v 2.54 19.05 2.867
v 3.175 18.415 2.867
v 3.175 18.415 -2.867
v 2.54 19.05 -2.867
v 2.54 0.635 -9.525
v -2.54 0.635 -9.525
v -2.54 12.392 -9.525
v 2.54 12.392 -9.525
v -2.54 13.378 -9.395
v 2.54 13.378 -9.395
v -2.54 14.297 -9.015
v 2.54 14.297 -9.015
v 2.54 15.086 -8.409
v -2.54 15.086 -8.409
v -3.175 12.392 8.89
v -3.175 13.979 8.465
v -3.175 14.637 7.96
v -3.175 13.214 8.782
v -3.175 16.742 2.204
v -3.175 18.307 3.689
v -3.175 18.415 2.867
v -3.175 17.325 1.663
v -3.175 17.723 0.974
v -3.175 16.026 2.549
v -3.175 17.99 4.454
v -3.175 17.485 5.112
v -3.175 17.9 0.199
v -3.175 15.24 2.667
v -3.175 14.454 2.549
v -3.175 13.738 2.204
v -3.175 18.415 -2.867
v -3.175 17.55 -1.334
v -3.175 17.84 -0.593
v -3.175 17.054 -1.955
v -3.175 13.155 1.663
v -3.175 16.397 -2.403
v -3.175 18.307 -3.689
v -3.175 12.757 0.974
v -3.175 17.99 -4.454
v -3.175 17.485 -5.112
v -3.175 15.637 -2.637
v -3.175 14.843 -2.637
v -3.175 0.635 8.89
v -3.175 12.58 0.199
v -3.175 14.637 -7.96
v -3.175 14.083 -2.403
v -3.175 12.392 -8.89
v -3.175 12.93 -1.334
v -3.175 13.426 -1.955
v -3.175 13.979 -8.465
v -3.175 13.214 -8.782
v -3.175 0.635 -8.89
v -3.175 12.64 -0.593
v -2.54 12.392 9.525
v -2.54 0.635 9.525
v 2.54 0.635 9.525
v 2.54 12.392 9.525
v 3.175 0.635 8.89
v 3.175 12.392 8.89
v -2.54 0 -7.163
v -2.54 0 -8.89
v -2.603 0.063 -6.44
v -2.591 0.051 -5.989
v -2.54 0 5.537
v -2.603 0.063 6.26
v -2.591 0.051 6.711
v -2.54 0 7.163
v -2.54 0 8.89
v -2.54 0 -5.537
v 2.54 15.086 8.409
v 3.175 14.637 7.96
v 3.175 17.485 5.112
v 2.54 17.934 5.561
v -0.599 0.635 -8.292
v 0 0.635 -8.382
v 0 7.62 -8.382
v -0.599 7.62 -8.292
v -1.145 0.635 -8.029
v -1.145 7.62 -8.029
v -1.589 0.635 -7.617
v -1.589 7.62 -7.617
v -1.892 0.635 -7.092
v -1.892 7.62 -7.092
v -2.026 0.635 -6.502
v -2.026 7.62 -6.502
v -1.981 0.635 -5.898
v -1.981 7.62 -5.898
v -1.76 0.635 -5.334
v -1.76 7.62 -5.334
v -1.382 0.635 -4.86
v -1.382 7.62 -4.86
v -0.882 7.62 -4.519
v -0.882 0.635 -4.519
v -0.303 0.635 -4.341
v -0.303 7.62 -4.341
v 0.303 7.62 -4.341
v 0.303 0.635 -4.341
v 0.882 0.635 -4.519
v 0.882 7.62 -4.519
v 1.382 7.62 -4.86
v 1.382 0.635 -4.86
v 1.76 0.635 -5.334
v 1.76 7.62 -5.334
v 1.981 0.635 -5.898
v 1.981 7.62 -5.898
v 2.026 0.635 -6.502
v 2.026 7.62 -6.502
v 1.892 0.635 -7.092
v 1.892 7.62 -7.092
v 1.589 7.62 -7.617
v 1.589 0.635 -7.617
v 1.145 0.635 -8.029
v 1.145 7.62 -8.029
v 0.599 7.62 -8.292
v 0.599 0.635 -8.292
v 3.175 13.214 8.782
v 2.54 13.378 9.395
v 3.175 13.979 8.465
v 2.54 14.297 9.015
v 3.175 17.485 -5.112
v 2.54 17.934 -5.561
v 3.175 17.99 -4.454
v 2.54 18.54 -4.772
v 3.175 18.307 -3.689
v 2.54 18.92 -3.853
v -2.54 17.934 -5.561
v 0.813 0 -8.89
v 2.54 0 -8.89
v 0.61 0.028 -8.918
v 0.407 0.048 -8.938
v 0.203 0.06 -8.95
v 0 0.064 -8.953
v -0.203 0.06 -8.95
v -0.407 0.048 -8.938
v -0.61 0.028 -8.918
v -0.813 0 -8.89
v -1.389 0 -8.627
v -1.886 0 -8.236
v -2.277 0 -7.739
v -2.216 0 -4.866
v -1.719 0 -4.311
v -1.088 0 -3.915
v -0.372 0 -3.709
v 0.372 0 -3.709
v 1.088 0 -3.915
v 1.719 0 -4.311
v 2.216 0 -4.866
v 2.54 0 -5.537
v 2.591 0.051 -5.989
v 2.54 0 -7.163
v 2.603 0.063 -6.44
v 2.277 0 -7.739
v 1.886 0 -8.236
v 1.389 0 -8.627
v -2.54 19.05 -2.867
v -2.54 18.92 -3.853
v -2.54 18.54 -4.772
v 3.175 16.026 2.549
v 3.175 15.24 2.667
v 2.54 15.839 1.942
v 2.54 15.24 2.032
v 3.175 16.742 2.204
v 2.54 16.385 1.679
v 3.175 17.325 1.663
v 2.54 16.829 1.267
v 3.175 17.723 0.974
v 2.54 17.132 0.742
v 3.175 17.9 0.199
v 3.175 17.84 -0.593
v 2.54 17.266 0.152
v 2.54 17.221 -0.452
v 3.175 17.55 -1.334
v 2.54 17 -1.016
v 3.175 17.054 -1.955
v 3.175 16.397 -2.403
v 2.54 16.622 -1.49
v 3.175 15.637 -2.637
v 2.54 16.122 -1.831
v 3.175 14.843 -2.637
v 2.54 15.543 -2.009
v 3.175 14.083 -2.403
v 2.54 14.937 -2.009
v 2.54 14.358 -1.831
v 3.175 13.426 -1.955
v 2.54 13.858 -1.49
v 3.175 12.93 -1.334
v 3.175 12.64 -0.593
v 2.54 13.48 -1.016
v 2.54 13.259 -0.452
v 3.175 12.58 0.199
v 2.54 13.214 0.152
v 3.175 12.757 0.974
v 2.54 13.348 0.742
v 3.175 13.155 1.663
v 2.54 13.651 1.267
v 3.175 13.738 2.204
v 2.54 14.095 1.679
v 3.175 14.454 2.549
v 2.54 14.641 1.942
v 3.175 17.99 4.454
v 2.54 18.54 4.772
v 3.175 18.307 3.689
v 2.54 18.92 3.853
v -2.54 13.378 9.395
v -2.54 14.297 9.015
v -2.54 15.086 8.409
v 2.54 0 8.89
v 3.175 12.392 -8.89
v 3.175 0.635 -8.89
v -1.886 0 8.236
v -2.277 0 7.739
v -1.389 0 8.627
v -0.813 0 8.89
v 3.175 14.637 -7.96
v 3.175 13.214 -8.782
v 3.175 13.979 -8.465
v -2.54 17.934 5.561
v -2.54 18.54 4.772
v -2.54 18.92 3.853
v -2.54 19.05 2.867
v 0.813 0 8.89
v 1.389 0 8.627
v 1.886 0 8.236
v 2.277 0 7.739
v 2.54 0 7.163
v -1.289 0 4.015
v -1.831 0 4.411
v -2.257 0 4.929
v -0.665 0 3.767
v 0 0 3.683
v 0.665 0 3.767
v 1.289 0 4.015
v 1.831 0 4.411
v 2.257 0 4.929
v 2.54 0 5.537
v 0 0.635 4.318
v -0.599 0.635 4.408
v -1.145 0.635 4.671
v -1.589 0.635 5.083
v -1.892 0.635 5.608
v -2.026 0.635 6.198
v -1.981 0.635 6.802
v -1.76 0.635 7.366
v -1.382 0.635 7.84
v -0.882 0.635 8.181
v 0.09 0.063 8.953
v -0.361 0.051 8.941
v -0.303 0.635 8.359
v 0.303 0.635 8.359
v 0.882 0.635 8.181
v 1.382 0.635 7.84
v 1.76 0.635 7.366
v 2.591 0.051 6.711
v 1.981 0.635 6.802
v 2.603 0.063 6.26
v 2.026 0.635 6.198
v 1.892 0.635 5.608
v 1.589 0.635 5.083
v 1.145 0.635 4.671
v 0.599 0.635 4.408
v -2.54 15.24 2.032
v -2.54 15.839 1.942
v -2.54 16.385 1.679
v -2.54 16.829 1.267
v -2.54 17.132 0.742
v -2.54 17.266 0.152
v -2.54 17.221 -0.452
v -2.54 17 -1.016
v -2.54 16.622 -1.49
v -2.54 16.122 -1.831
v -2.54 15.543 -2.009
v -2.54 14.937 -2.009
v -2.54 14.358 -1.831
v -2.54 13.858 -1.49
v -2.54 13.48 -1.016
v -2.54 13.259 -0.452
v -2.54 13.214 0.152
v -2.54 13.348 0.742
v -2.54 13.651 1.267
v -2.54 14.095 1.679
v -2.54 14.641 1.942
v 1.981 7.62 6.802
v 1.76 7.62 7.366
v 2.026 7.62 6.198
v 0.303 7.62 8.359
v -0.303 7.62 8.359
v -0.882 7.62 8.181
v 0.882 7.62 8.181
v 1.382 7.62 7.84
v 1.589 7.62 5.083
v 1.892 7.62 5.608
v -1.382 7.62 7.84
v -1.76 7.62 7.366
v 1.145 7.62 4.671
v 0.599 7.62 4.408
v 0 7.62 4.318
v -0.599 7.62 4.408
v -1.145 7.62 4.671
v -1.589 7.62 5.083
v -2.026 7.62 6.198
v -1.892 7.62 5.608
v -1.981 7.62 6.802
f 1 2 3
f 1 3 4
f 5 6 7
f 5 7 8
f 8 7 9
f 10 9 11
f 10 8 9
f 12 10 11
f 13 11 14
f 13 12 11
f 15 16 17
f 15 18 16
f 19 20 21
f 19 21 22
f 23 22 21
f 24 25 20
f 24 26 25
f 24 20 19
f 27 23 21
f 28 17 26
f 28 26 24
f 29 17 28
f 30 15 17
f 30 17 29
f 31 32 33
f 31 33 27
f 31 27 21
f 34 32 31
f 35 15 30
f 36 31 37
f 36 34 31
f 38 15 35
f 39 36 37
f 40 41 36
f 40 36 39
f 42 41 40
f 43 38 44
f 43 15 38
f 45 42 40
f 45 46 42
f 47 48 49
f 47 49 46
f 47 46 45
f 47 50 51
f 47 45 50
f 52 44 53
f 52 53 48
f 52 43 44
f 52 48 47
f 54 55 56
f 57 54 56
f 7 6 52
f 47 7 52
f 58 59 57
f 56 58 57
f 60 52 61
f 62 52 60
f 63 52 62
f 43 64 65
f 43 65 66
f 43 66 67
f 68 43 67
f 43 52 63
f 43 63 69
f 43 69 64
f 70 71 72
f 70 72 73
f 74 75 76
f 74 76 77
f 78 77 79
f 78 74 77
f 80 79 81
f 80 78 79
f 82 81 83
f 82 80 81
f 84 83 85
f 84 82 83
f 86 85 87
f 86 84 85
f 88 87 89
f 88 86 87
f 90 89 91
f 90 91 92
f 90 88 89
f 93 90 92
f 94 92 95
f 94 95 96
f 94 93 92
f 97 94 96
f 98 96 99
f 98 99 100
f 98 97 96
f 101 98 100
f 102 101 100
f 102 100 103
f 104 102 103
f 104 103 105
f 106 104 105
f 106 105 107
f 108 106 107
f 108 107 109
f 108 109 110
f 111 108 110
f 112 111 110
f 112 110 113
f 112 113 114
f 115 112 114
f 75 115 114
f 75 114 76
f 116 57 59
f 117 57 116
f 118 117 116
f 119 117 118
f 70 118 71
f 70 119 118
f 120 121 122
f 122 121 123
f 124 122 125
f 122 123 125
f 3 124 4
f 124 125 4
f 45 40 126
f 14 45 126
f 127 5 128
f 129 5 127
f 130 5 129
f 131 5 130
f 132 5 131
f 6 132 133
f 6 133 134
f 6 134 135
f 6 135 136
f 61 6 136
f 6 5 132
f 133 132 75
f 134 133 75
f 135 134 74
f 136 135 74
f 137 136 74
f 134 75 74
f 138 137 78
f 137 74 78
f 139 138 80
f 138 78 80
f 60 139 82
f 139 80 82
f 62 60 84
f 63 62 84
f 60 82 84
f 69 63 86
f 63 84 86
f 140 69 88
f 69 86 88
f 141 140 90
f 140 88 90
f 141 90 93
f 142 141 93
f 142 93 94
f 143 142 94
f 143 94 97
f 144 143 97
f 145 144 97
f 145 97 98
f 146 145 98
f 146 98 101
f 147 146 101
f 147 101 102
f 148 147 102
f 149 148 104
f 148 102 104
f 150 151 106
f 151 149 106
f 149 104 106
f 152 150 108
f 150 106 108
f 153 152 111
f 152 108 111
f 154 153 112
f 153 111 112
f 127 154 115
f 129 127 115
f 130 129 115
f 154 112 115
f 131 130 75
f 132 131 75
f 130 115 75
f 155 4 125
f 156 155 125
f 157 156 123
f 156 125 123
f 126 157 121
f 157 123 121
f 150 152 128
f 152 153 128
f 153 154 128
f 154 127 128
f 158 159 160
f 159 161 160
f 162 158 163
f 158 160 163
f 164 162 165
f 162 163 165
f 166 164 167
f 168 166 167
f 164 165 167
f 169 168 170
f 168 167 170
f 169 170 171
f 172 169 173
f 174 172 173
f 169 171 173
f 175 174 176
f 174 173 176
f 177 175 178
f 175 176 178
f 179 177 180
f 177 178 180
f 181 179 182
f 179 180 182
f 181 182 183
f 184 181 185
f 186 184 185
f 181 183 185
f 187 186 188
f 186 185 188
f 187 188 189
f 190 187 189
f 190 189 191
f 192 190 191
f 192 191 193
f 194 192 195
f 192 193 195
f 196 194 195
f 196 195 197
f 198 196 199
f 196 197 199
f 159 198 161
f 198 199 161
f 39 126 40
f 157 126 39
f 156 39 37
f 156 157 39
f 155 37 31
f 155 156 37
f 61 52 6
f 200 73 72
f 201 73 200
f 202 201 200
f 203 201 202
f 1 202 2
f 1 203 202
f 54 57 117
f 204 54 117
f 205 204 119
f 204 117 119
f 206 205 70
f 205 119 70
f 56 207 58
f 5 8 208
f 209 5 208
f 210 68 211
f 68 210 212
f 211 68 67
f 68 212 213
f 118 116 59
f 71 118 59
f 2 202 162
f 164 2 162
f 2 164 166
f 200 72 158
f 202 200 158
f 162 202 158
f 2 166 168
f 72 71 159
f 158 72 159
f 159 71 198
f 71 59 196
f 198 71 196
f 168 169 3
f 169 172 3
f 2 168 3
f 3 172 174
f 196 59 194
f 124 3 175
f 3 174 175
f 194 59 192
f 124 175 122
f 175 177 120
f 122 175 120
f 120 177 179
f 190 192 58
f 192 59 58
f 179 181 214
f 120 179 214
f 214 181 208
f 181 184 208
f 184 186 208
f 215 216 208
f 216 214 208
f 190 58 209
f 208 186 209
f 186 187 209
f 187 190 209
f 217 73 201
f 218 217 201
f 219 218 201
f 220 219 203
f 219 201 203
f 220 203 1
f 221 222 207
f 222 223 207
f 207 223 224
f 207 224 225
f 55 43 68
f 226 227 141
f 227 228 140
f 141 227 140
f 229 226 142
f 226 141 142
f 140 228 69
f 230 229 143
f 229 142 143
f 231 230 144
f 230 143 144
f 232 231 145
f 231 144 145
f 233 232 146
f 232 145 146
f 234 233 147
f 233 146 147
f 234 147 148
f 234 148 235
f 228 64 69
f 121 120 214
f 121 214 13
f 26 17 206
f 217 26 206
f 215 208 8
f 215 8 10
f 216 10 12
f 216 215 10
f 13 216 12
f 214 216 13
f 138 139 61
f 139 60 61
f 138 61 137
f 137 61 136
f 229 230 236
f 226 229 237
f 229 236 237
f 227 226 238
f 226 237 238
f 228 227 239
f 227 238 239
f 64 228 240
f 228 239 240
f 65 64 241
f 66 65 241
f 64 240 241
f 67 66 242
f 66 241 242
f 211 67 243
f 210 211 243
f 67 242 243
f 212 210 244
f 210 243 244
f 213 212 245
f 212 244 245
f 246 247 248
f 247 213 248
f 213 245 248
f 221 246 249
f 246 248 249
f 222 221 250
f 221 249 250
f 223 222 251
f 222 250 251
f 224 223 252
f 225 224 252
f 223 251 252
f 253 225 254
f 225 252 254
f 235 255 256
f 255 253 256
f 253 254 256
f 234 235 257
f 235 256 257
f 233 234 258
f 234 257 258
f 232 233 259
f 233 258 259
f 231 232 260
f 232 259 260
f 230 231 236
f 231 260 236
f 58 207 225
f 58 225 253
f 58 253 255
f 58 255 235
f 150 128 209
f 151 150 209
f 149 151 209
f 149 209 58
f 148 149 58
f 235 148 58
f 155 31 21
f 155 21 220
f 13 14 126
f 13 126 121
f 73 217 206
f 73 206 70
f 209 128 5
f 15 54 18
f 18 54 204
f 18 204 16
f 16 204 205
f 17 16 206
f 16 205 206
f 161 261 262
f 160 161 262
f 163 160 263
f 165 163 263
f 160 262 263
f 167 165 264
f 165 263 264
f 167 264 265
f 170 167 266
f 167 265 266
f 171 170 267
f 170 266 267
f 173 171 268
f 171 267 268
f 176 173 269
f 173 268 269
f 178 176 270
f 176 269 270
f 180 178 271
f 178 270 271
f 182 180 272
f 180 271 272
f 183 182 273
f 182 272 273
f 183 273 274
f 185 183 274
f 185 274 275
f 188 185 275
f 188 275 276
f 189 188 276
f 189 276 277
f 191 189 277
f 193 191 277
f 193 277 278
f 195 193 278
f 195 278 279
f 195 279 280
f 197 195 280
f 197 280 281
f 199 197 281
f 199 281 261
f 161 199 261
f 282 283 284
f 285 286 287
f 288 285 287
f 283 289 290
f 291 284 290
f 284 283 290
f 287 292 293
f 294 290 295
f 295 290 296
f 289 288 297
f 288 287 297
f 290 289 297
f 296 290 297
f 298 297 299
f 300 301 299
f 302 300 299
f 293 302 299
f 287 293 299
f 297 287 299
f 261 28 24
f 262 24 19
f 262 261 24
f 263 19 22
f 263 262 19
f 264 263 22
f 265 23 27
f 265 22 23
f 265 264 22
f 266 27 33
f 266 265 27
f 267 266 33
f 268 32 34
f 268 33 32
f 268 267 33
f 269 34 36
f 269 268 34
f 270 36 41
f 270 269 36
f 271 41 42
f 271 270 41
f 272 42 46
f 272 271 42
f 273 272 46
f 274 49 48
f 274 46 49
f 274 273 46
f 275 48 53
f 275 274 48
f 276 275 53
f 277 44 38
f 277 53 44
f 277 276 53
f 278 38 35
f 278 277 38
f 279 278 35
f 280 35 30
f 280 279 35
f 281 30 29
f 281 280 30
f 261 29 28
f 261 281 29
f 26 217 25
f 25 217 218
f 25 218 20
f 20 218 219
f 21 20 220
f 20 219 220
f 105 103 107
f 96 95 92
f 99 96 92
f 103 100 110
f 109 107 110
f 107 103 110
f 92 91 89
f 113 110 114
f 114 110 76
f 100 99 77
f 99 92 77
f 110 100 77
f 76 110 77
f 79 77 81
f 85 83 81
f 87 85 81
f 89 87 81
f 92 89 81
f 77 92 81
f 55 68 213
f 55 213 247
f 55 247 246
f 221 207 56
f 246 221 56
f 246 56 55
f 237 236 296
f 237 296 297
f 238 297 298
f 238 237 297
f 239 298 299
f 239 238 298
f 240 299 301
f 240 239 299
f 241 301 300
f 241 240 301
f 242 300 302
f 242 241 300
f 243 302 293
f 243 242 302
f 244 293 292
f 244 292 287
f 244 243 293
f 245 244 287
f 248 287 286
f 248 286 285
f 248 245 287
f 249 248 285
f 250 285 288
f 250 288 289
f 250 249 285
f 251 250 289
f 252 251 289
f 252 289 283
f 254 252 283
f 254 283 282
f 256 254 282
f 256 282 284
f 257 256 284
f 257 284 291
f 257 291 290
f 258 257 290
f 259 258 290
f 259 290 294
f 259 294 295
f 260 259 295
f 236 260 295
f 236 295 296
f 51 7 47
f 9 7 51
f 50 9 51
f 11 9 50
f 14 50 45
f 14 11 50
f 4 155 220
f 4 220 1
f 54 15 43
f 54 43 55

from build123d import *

# Parameters (mm, degrees)
SKETCH1_W           = 6.35
SKETCH1_H           = 19.05
BOSS_EXTRUDE1_DEPTH = 19.05
SKETCH2_R           = 2.032
CUT_EXTRUDE1_DEPTH  = 23.225
SKETCH1_3_R         = 2.032
CUT_EXTRUDE2_DEPTH  = 7.62
CHAMFER1_SIZE       = 5.08
FILLET1_R           = 3.81


with BuildPart() as part:
    # Sketch1 → Boss-Extrude1 (new body)
    with BuildSketch(Plane(origin=(0, 0, 0), x_dir=(1, 0, 0), z_dir=(0, 1, 0))):
        Rectangle(SKETCH1_W, SKETCH1_H)
    extrude(amount=BOSS_EXTRUDE1_DEPTH)

    # Sketch2 → Cut-Extrude1 (cut, through all)
    with BuildSketch(Plane.ZY.offset(3.175)):
        with Locations((0, 15.24)):
            Circle(SKETCH2_R)
    extrude(amount=-CUT_EXTRUDE1_DEPTH, mode=Mode.SUBTRACT)

    # Sketch1<3> → Cut-Extrude2 (cut)
    with BuildSketch(Plane(origin=(0, 0, 0), x_dir=(1, 0, 0), z_dir=(0, 1, 0))):
        with Locations(Location((0, 6.35, 0), (0, 0, 90))):
            Circle(SKETCH1_3_R)
        with Locations(Location((0, -6.35, 0), (0, 0, 90))):
            Circle(SKETCH1_3_R)
    extrude(amount=CUT_EXTRUDE2_DEPTH, mode=Mode.SUBTRACT)

    # Chamfer1
    chamfer1_edges = [part.edges().sort_by_distance(p)[0] for p in [
        (0, 19.05, 9.525),
        (0, 19.05, -9.525),
    ]]
    chamfer(chamfer1_edges, length=CHAMFER1_SIZE)

    # Fillet1
    fillet1_edges = [part.edges().sort_by_distance(p)[0] for p in [
        (0, 19.05, -4.445),
        (0, 19.05, 4.445),
        (0, 13.97, 9.525),
        (0, 13.97, -9.525),
    ]]
    fillet(fillet1_edges, radius=FILLET1_R)

    # Chamfer2
    # the kernel refuses this chamfer: 0.635 mm, written as the material it takes off along each edge
    with BuildSketch(Plane(origin=(2.751666667, 0.423333333, 9.101666667), x_dir=(0.7071067811865476, 0.7071067811865474, 0), z_dir=(0.5773502691896255, -0.5773502691896256, 0.5773502691896261)), Plane(origin=(-2.751666667, 0.423333333, 9.101666667), x_dir=(0.7071067811865476, -0.7071067811865474, 0), z_dir=(-0.5773502691896257, -0.5773502691896258, 0.5773502691896257))) as chamfer2_piece_1:
        Polygon((-0.449012806, -0.259237664), (0.449012806, -0.259237664), (0, 0.518475329), align=None)
    extrude(amount=0.806558326, mode=Mode.SUBTRACT)
    with BuildSketch(Plane(origin=(-2.751666667, 0.423333333, -9.101666667), x_dir=(-0.7071067811865476, 0, 0.7071067811865476), z_dir=(-0.5773502691896258, -0.5773502691896255, -0.5773502691896258)), Plane(origin=(2.751666667, 0.423333333, -9.101666667), x_dir=(0, -0.7071067811865477, 0.7071067811865474), z_dir=(0.5773502691896258, -0.5773502691896255, -0.5773502691896258))) as chamfer2_piece_2:
        Polygon((-0.449012806, 0.259237664), (0.449012806, 0.259237664), (0, -0.518475329), align=None)
    extrude(amount=0.806558326, mode=Mode.SUBTRACT)
    with BuildSketch(Plane(origin=(3.175, 15.24, 0), x_dir=(0, 0, 1), z_dir=(0, -1, 0))) as chamfer2_piece_3:
        with BuildLine():
            Line((2.684960512, -0.017960512), (2.014039488, 0.652960512))
            Line((2.014039488, 0.652960512), (2.001339488, 0.652960512))
            ThreePointArc((2.001339488, 0.652960512), (2.0193, 0.326480256), (2.0193, 0))
            Line((2.0193, 0), (2.032, -0.0127))
            ThreePointArc((2.032, -0.0127), (2.358480256, -0.0127), (2.684960512, -0.030660512))
            Line((2.684960512, -0.030660512), (2.684960512, -0.017960512))
        make_face()
    revolve(axis=Axis((3.175, 15.24, 0), (-1, 0, 0)), mode=Mode.SUBTRACT)
    with BuildSketch(Plane(origin=(-3.175, 15.24, 0), x_dir=(0, 0, 1), z_dir=(0, -1, 0))) as chamfer2_piece_4:
        with BuildLine():
            Line((2.684960512, 0.017960512), (2.014039488, -0.652960512))
            Line((2.014039488, -0.652960512), (2.001339488, -0.652960512))
            ThreePointArc((2.001339488, -0.652960512), (2.0193, -0.326480256), (2.0193, 0))
            Line((2.0193, 0), (2.032, 0.0127))
            ThreePointArc((2.032, 0.0127), (2.358480256, 0.0127), (2.684960512, 0.030660512))
            Line((2.684960512, 0.030660512), (2.684960512, 0.017960512))
        make_face()
    revolve(axis=Axis((-3.175, 15.24, 0), (-1, 0, 0)), mode=Mode.SUBTRACT)
    with BuildSketch(Plane(origin=(0, 0, -6.35), x_dir=(0, 0, -1), z_dir=(1, 0, 0))) as chamfer2_piece_5:
        with BuildLine():
            Line((2.684960512, -0.017960512), (2.014039488, 0.652960512))
            Line((2.014039488, 0.652960512), (2.001339488, 0.652960512))
            ThreePointArc((2.001339488, 0.652960512), (2.0193, 0.326480256), (2.0193, 0))
            Line((2.0193, 0), (2.032, -0.0127))
            ThreePointArc((2.032, -0.0127), (2.358480256, -0.0127), (2.684960512, -0.030660512))
            Line((2.684960512, -0.030660512), (2.684960512, -0.017960512))
        make_face()
    revolve(axis=Axis((0, 0, -6.35), (0, 1, 0)), mode=Mode.SUBTRACT)
    with BuildSketch(Plane(origin=(0, 0, 6.35), x_dir=(0, 0, -1), z_dir=(1, 0, 0))) as chamfer2_piece_6:
        with BuildLine():
            Line((2.684960512, -0.017960512), (2.014039488, 0.652960512))
            Line((2.014039488, 0.652960512), (2.001339488, 0.652960512))
            ThreePointArc((2.001339488, 0.652960512), (2.0193, 0.326480256), (2.0193, 0))
            Line((2.0193, 0), (2.032, -0.0127))
            ThreePointArc((2.032, -0.0127), (2.358480256, -0.0127), (2.684960512, -0.030660512))
            Line((2.684960512, -0.030660512), (2.684960512, -0.017960512))
        make_face()
    revolve(axis=Axis((0, 0, 6.35), (0, 1, 0)), mode=Mode.SUBTRACT)
    with BuildSketch(Plane(origin=(3.175, -1.633018697, 9.525), x_dir=(0.027495876610586664, 0, -0.9996219169112968), z_dir=(0, 1, 0)), Plane(origin=(3.175, -1.633018697, -9.525), x_dir=(-0.9996219169112968, 0, -0.027495876610587288), z_dir=(0, 1, 0))) as chamfer2_piece_7:
        with BuildLine():
            Line((0.653207479, 0), (-0.035907443, 0.652219799))
            Line((-0.035907443, 0.652219799), (-0.048602642, 0.651870601))
            ThreePointArc((-0.048602642, 0.651870601), (-0.021672059, 0.326007622), (-0.012695198, -0.000349198))
            Line((-0.012695198, -0.000349198), (0.000349198, -0.012695198))
            ThreePointArc((0.000349198, -0.012695198), (0.326706017, -0.003718338), (0.653556677, -0.012695198))
            Line((0.653556677, -0.012695198), (0.653207479, 0))
        make_face()
    extrude(amount=14.024865025, mode=Mode.SUBTRACT)
    with BuildSketch(Plane(origin=(-3.175, -1.633018697, 9.525), x_dir=(-0.02749587661058659, 0, -0.9996219169112968), z_dir=(0, 1, 0)), Plane(origin=(-3.175, -1.633018697, -9.525), x_dir=(0.9996219169112968, 0, -0.027495876610587288), z_dir=(0, 1, 0))) as chamfer2_piece_8:
        with BuildLine():
            Line((0.653207479, 0), (-0.035907443, -0.652219799))
            Line((-0.035907443, -0.652219799), (-0.048602642, -0.651870601))
            ThreePointArc((-0.048602642, -0.651870601), (-0.021672059, -0.326007622), (-0.012695198, 0.000349198))
            Line((-0.012695198, 0.000349198), (0.000349198, 0.012695198))
            ThreePointArc((0.000349198, 0.012695198), (0.326706017, 0.003718338), (0.653556677, 0.012695198))
            Line((0.653556677, 0.012695198), (0.653207479, 0))
        make_face()
    extrude(amount=14.024865025, mode=Mode.SUBTRACT)
    with BuildSketch(Plane(origin=(-3.175, 17.934076836, 5.560923164), x_dir=(-0.027495876610585324, -0.7068394360706735, -0.7068394360706735), z_dir=(0, -0.7071067811865476, 0.7071067811865476)), Plane(origin=(-3.175, 15.085923164, -8.409076836), x_dir=(-0.027495876610586552, -0.7068394360706735, 0.7068394360706735), z_dir=(0, 0.7071067811865476, 0.7071067811865476))) as chamfer2_piece_9:
        with BuildLine():
            Line((0.653207479, 0), (-0.035907443, 0.652219799))
            Line((-0.035907443, 0.652219799), (-0.048602642, 0.651870601))
            ThreePointArc((-0.048602642, 0.651870601), (-0.021672059, 0.326007622), (-0.012695198, -0.000349198))
            Line((-0.012695198, -0.000349198), (0.000349198, -0.012695198))
            ThreePointArc((0.000349198, -0.012695198), (0.326706017, -0.003718338), (0.653556677, -0.012695198))
            Line((0.653556677, -0.012695198), (0.653207479, 0))
        make_face()
    extrude(amount=4.027897552, mode=Mode.SUBTRACT)
    with BuildSketch(Plane(origin=(-3.175, 19.05, 2.866846327), x_dir=(-0.02749587661058659, -0.9996219169112968, 0), z_dir=(0, 0, -1)), Plane(origin=(3.175, 19.05, -2.866846327), x_dir=(0.02749587661058659, -0.9996219169112968, 0), z_dir=(0, 0, 1))) as chamfer2_piece_10:
        with BuildLine():
            Line((0.653207479, 0), (-0.035907443, -0.652219799))
            Line((-0.035907443, -0.652219799), (-0.048602642, -0.651870601))
            ThreePointArc((-0.048602642, -0.651870601), (-0.021672059, -0.326007622), (-0.012695198, 0.000349198))
            Line((-0.012695198, 0.000349198), (0.000349198, 0.012695198))
            ThreePointArc((0.000349198, 0.012695198), (0.326706017, 0.003718338), (0.653556677, 0.012695198))
            Line((0.653556677, 0.012695198), (0.653207479, 0))
        make_face()
    extrude(amount=5.733692655, mode=Mode.SUBTRACT)
    with BuildSketch(Plane(origin=(-3.175, 15.24, -2.866846327), x_dir=(0, 0.7071067811865476, -0.7071067811865474), z_dir=(0, -0.7071067811865474, -0.7071067811865476))) as chamfer2_piece_11:
        with BuildLine():
            Line((3.157039488, -0.017960512), (3.827960512, 0.652960512))
            Line((3.827960512, 0.652960512), (3.840660512, 0.652960512))
            ThreePointArc((3.840660512, 0.652960512), (3.8227, 0.326480256), (3.8227, 0))
            Line((3.8227, 0), (3.81, -0.0127))
            ThreePointArc((3.81, -0.0127), (3.483519744, -0.0127), (3.157039488, -0.030660512))
            Line((3.157039488, -0.030660512), (3.157039488, -0.017960512))
        make_face()
    revolve(axis=Axis((-3.175, 15.24, -2.866846327), (1, 0, 0)), revolution_arc=45, mode=Mode.SUBTRACT)
    with BuildSketch(Plane(origin=(-3.175, 12.391846327, -5.715), x_dir=(0, 0, -1), z_dir=(0, -1, 0))) as chamfer2_piece_12:
        with BuildLine():
            Line((3.157039488, -0.017960512), (3.827960512, 0.652960512))
            Line((3.827960512, 0.652960512), (3.840660512, 0.652960512))
            ThreePointArc((3.840660512, 0.652960512), (3.8227, 0.326480256), (3.8227, 0))
            Line((3.8227, 0), (3.81, -0.0127))
            ThreePointArc((3.81, -0.0127), (3.483519744, -0.0127), (3.157039488, -0.030660512))
            Line((3.157039488, -0.030660512), (3.157039488, -0.017960512))
        make_face()
    revolve(axis=Axis((-3.175, 12.391846327, -5.715), (1, 0, 0)), revolution_arc=45, mode=Mode.SUBTRACT)
    with BuildSketch(Plane(origin=(-3.175, 15.24, 2.866846327), x_dir=(0, 0.7071067811865476, 0.7071067811865474), z_dir=(0, -0.7071067811865474, 0.7071067811865476))) as chamfer2_piece_13:
        with BuildLine():
            Line((3.157039488, 0.017960512), (3.827960512, -0.652960512))
            Line((3.827960512, -0.652960512), (3.840660512, -0.652960512))
            ThreePointArc((3.840660512, -0.652960512), (3.8227, -0.326480256), (3.8227, 0))
            Line((3.8227, 0), (3.81, 0.0127))
            ThreePointArc((3.81, 0.0127), (3.483519744, 0.0127), (3.157039488, 0.030660512))
            Line((3.157039488, 0.030660512), (3.157039488, 0.017960512))
        make_face()
    revolve(axis=Axis((-3.175, 15.24, 2.866846327), (-1, 0, 0)), revolution_arc=45, mode=Mode.SUBTRACT)
    with BuildSketch(Plane(origin=(-3.175, 12.391846327, 5.715), x_dir=(0, 0, 1), z_dir=(0, -1, 0))) as chamfer2_piece_14:
        with BuildLine():
            Line((3.157039488, 0.017960512), (3.827960512, -0.652960512))
            Line((3.827960512, -0.652960512), (3.840660512, -0.652960512))
            ThreePointArc((3.840660512, -0.652960512), (3.8227, -0.326480256), (3.8227, 0))
            Line((3.8227, 0), (3.81, 0.0127))
            ThreePointArc((3.81, 0.0127), (3.483519744, 0.0127), (3.157039488, 0.030660512))
            Line((3.157039488, 0.030660512), (3.157039488, 0.017960512))
        make_face()
    revolve(axis=Axis((-3.175, 12.391846327, 5.715), (-1, 0, 0)), revolution_arc=45, mode=Mode.SUBTRACT)
    with BuildSketch(Plane(origin=(3.175, 17.934076836, 5.560923164), x_dir=(0.02749587661058674, -0.7068394360706736, -0.7068394360706736), z_dir=(0, -0.7071067811865476, 0.7071067811865476)), Plane(origin=(3.175, 15.085923164, -8.409076836), x_dir=(0.027495876610585872, -0.7068394360706735, 0.7068394360706735), z_dir=(0, 0.7071067811865476, 0.7071067811865476))) as chamfer2_piece_15:
        with BuildLine():
            Line((0.653207479, 0), (-0.035907443, -0.652219799))
            Line((-0.035907443, -0.652219799), (-0.048602642, -0.651870601))
            ThreePointArc((-0.048602642, -0.651870601), (-0.021672059, -0.326007622), (-0.012695198, 0.000349198))
            Line((-0.012695198, 0.000349198), (0.000349198, 0.012695198))
            ThreePointArc((0.000349198, 0.012695198), (0.326706017, 0.003718338), (0.653556677, 0.012695198))
            Line((0.653556677, 0.012695198), (0.653207479, 0))
        make_face()
    extrude(amount=4.027897552, mode=Mode.SUBTRACT)
    with BuildSketch(Plane(origin=(-3.175, 0, 11.158018697), x_dir=(-0.027495876610586605, 0.9996219169112968, 0), z_dir=(0, 0, -1))) as chamfer2_piece_16:
        with BuildLine():
            Line((0.653207479, 0), (-0.035907443, 0.652219799))
            Line((-0.035907443, 0.652219799), (-0.048602642, 0.651870601))
            ThreePointArc((-0.048602642, 0.651870601), (-0.021672059, 0.326007622), (-0.012695198, -0.000349198))
            Line((-0.012695198, -0.000349198), (0.000349198, -0.012695198))
            ThreePointArc((0.000349198, -0.012695198), (0.326706017, -0.003718338), (0.653556677, -0.012695198))
            Line((0.653556677, -0.012695198), (0.653207479, 0))
        make_face()
    extrude(amount=22.316037395, mode=Mode.SUBTRACT)
    with BuildSketch(Plane(origin=(3.175, 15.24, -2.866846327), x_dir=(0, 0.7071067811865476, -0.7071067811865474), z_dir=(0, -0.7071067811865474, -0.7071067811865476))) as chamfer2_piece_17:
        with BuildLine():
            Line((3.157039488, 0.017960512), (3.827960512, -0.652960512))
            Line((3.827960512, -0.652960512), (3.840660512, -0.652960512))
            ThreePointArc((3.840660512, -0.652960512), (3.8227, -0.326480256), (3.8227, 0))
            Line((3.8227, 0), (3.81, 0.0127))
            ThreePointArc((3.81, 0.0127), (3.483519744, 0.0127), (3.157039488, 0.030660512))
            Line((3.157039488, 0.030660512), (3.157039488, 0.017960512))
        make_face()
    revolve(axis=Axis((3.175, 15.24, -2.866846327), (1, 0, 0)), revolution_arc=45, mode=Mode.SUBTRACT)
    with BuildSketch(Plane(origin=(3.175, 12.391846327, -5.715), x_dir=(0, 0, -1), z_dir=(0, -1, 0))) as chamfer2_piece_18:
        with BuildLine():
            Line((3.827960512, -0.652960512), (3.157039488, 0.017960512))
            Line((3.157039488, 0.017960512), (3.157039488, 0.030660512))
            ThreePointArc((3.157039488, 0.030660512), (3.483519744, 0.0127), (3.81, 0.0127))
            Line((3.81, 0.0127), (3.8227, 0))
            ThreePointArc((3.8227, 0), (3.8227, -0.326480256), (3.840660512, -0.652960512))
            Line((3.840660512, -0.652960512), (3.827960512, -0.652960512))
        make_face()
    revolve(axis=Axis((3.175, 12.391846327, -5.715), (1, 0, 0)), revolution_arc=45, mode=Mode.SUBTRACT)
    with BuildSketch(Plane(origin=(3.175, 15.24, 2.866846327), x_dir=(0, 0.7071067811865476, 0.7071067811865474), z_dir=(0, -0.7071067811865474, 0.7071067811865476))) as chamfer2_piece_19:
        with BuildLine():
            Line((3.157039488, -0.017960512), (3.827960512, 0.652960512))
            Line((3.827960512, 0.652960512), (3.840660512, 0.652960512))
            ThreePointArc((3.840660512, 0.652960512), (3.8227, 0.326480256), (3.8227, 0))
            Line((3.8227, 0), (3.81, -0.0127))
            ThreePointArc((3.81, -0.0127), (3.483519744, -0.0127), (3.157039488, -0.030660512))
            Line((3.157039488, -0.030660512), (3.157039488, -0.017960512))
        make_face()
    revolve(axis=Axis((3.175, 15.24, 2.866846327), (-1, 0, 0)), revolution_arc=45, mode=Mode.SUBTRACT)
    with BuildSketch(Plane(origin=(3.175, 12.391846327, 5.715), x_dir=(0, 0, 1), z_dir=(0, -1, 0))) as chamfer2_piece_20:
        with BuildLine():
            Line((3.157039488, -0.017960512), (3.827960512, 0.652960512))
            Line((3.827960512, 0.652960512), (3.840660512, 0.652960512))
            ThreePointArc((3.840660512, 0.652960512), (3.8227, 0.326480256), (3.8227, 0))
            Line((3.8227, 0), (3.81, -0.0127))
            ThreePointArc((3.81, -0.0127), (3.483519744, -0.0127), (3.157039488, -0.030660512))
            Line((3.157039488, -0.030660512), (3.157039488, -0.017960512))
        make_face()
    revolve(axis=Axis((3.175, 12.391846327, 5.715), (-1, 0, 0)), revolution_arc=45, mode=Mode.SUBTRACT)
    with BuildSketch(Plane(origin=(4.808018697, 0, 9.525), x_dir=(0, -0.02749587661058637, -0.9996219169112968), z_dir=(-1, 0, 0))) as chamfer2_piece_21:
        with BuildLine():
            Line((0.653207479, 0), (-0.035907443, -0.652219799))
            Line((-0.035907443, -0.652219799), (-0.048602642, -0.651870601))
            ThreePointArc((-0.048602642, -0.651870601), (-0.021672059, -0.326007622), (-0.012695198, 0.000349198))
            Line((-0.012695198, 0.000349198), (0.000349198, 0.012695198))
            ThreePointArc((0.000349198, 0.012695198), (0.326706017, 0.003718338), (0.653556677, 0.012695198))
            Line((0.653556677, 0.012695198), (0.653207479, 0))
        make_face()
    extrude(amount=9.616037395, mode=Mode.SUBTRACT)
    with BuildSketch(Plane(origin=(3.175, 0, -11.158018697), x_dir=(-0.9996219169112968, -0.02749587661058635, 0), z_dir=(0, 0, 1))) as chamfer2_piece_22:
        with BuildLine():
            Line((0.653207479, 0), (-0.035907443, -0.652219799))
            Line((-0.035907443, -0.652219799), (-0.048602642, -0.651870601))
            ThreePointArc((-0.048602642, -0.651870601), (-0.021672059, -0.326007622), (-0.012695198, 0.000349198))
            Line((-0.012695198, 0.000349198), (0.000349198, 0.012695198))
            ThreePointArc((0.000349198, 0.012695198), (0.326706017, 0.003718338), (0.653556677, 0.012695198))
            Line((0.653556677, 0.012695198), (0.653207479, 0))
        make_face()
    extrude(amount=22.316037395, mode=Mode.SUBTRACT)
    with BuildSketch(Plane(origin=(-4.808018697, 0, -9.525), x_dir=(0, 0.9996219169112966, -0.02749587661058728), z_dir=(1, 0, 0))) as chamfer2_piece_23:
        with BuildLine():
            Line((0.653207479, 0), (-0.035907443, 0.652219799))
            Line((-0.035907443, 0.652219799), (-0.048602642, 0.651870601))
            ThreePointArc((-0.048602642, 0.651870601), (-0.021672059, 0.326007622), (-0.012695198, -0.000349198))
            Line((-0.012695198, -0.000349198), (0.000349198, -0.012695198))
            ThreePointArc((0.000349198, -0.012695198), (0.326706017, -0.003718338), (0.653556677, -0.012695198))
            Line((0.653556677, -0.012695198), (0.653207479, 0))
        make_face()
    extrude(amount=9.616037395, mode=Mode.SUBTRACT)


solid = part.part
